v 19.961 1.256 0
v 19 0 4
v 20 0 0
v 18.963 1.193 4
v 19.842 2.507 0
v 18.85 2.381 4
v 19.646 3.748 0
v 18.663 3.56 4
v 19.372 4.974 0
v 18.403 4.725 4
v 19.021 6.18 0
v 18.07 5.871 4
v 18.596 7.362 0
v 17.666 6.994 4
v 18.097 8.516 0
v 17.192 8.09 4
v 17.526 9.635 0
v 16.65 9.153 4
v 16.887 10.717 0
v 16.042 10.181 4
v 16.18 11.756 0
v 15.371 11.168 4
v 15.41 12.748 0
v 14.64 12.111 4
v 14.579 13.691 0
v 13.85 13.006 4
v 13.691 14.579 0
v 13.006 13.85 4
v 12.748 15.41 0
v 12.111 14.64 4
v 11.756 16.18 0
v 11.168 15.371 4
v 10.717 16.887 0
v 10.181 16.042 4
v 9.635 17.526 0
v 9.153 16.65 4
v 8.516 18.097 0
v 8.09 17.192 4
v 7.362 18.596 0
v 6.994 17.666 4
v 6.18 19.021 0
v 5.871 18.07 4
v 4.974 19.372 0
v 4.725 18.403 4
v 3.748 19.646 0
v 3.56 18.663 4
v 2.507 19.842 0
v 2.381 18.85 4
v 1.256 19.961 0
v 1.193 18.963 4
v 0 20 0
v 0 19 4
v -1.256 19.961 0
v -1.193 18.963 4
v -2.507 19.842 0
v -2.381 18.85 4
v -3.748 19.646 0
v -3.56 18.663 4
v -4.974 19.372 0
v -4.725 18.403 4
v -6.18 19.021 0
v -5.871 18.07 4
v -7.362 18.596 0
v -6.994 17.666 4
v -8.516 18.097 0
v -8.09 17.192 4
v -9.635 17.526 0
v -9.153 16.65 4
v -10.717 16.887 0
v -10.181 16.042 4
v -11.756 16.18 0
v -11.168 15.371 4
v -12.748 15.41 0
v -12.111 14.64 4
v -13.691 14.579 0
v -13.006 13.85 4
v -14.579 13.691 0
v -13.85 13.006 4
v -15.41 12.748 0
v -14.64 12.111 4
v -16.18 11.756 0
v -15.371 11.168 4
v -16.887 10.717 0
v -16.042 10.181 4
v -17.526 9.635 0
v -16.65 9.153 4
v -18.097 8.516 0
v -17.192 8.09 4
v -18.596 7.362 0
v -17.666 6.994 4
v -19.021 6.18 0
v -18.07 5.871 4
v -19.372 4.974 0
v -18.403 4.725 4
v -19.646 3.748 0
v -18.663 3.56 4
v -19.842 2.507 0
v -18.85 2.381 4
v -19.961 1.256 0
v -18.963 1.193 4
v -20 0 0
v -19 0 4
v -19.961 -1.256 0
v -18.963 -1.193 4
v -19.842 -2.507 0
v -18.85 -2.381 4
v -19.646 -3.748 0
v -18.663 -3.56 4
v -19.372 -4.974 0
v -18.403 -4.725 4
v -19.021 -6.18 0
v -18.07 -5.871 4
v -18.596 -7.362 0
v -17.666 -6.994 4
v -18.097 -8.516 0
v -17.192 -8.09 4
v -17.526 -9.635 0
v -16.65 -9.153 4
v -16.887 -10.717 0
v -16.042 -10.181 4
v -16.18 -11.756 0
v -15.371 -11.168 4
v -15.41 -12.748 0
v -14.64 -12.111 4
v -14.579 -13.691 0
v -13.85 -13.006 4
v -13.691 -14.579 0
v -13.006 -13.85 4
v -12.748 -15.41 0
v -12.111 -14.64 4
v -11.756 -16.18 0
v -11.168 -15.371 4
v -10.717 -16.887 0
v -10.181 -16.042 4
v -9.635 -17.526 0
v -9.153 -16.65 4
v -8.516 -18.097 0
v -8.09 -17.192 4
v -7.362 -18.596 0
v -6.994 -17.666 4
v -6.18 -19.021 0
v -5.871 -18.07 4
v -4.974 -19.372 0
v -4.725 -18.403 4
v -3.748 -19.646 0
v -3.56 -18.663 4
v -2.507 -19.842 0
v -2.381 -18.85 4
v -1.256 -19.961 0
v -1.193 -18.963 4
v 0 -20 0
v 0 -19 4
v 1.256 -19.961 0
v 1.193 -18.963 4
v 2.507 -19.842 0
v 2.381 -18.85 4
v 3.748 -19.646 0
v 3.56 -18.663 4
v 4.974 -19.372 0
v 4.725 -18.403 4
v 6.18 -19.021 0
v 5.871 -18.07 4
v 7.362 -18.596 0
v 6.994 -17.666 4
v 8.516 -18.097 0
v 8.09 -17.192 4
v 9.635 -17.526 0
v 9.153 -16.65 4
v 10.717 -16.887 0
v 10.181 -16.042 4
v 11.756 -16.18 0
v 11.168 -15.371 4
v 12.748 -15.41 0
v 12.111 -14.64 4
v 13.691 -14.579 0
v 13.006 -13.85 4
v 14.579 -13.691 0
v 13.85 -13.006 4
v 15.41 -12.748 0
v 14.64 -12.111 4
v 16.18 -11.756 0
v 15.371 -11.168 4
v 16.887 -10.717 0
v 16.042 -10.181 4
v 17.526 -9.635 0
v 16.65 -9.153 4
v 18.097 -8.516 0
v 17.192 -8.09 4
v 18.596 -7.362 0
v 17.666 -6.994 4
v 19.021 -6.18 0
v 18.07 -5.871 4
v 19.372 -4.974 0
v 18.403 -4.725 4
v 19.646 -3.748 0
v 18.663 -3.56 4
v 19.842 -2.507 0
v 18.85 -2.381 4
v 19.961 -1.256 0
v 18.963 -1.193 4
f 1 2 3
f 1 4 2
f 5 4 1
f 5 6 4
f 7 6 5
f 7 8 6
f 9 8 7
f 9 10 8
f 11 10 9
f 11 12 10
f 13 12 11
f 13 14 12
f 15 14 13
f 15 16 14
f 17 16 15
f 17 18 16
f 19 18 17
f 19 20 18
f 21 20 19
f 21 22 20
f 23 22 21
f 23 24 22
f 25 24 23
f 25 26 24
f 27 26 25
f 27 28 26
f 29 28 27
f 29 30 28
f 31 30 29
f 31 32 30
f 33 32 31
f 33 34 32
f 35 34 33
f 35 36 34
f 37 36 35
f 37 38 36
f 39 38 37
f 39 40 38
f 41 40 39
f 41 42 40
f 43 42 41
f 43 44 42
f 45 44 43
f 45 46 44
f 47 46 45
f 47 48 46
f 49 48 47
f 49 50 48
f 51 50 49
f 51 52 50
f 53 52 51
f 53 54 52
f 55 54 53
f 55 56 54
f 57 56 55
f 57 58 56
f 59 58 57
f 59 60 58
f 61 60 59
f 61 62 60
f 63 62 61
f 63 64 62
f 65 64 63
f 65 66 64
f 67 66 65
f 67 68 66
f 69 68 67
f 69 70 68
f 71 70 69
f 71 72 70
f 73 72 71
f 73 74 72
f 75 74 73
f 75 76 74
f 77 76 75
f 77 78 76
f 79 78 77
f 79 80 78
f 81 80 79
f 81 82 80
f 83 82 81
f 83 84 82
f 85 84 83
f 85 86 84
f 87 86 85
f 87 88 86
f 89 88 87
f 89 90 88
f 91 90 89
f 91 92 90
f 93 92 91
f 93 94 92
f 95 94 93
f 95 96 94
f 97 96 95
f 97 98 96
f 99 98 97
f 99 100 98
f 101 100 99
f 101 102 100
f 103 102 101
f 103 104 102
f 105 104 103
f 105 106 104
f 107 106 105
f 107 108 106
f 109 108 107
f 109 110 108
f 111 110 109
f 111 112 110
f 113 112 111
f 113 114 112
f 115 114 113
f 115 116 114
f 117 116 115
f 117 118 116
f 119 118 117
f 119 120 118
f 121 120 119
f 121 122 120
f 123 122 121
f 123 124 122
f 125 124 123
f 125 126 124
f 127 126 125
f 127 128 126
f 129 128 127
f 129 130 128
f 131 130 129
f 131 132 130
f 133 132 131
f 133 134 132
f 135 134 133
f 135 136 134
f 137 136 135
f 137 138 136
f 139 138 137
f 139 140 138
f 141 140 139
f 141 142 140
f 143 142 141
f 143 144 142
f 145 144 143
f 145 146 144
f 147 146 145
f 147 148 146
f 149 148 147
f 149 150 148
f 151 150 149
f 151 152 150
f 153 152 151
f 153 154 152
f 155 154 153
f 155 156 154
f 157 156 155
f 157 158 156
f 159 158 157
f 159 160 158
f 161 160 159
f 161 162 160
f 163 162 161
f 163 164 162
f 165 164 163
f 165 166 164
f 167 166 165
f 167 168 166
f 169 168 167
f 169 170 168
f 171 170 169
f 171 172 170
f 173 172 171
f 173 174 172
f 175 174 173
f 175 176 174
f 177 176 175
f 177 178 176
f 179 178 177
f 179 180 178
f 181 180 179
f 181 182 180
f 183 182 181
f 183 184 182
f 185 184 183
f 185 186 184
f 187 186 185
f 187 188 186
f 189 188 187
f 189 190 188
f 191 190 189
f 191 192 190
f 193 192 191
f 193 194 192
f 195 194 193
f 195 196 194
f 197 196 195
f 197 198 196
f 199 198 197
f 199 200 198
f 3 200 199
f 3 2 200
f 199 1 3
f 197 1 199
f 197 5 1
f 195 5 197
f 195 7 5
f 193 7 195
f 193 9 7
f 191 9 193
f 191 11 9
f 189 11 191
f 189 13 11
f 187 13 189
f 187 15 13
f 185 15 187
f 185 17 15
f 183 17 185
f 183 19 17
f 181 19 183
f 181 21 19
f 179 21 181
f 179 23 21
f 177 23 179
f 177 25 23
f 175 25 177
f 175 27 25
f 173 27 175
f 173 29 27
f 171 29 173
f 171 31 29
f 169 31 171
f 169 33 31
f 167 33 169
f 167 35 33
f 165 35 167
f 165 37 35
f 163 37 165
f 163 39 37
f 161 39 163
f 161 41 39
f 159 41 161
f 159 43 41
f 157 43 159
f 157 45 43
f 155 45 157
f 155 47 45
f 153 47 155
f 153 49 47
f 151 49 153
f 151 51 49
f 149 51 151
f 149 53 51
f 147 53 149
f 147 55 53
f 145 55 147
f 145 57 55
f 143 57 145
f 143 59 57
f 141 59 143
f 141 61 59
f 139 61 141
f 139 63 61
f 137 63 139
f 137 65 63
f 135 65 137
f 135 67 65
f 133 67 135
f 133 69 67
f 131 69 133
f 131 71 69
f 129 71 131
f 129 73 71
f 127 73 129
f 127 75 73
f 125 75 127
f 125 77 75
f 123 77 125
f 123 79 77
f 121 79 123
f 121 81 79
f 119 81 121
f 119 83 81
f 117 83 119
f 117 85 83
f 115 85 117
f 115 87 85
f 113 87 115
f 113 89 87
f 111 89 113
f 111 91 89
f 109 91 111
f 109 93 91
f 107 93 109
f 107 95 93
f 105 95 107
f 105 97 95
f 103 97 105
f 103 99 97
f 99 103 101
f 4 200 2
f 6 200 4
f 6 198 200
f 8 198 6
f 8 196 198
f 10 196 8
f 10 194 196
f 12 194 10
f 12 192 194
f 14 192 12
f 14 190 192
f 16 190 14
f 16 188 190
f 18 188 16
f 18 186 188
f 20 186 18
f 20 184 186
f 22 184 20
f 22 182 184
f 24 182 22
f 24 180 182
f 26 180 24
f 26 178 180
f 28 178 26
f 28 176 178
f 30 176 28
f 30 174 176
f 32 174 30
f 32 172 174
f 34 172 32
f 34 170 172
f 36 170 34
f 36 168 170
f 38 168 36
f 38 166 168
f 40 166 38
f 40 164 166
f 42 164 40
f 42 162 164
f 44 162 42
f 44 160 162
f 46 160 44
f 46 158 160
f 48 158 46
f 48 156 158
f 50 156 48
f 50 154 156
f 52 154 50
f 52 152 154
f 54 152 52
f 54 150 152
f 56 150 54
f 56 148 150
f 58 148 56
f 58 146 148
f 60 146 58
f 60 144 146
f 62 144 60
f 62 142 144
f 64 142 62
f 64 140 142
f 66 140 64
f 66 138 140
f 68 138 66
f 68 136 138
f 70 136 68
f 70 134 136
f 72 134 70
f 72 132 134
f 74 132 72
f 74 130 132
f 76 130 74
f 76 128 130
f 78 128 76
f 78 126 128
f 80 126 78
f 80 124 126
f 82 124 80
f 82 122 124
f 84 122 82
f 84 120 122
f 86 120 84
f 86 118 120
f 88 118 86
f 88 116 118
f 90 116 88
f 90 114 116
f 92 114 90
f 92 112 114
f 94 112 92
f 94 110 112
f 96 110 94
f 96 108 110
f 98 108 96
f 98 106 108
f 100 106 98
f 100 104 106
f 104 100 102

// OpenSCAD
// file: build.scad
$build_id = "";

function building(filename) = is_undef(filename) ?
  !is_undef(build)
  : !is_undef(build) && build == filename;

function previewing() = !building();

module build(filename) {
  $build_id = filename;

  if(!is_undef(scad_build_scan) && scad_build_scan == true) {
    echo(str("scad_build_scan: ", filename));
  }
  else if(previewing() || build == filename) {
    children();
  }
}

module preview_row(spacing) {
  if(previewing()) {
    for(x = [0:1:$children - 1]) {
      translate([x * spacing, 0, 0]) {
        children(x);
      }
    }
  }
  else {
    children();
  }
}

module preview_column(spacing) {
  if(previewing()) {
    for(y = [0:1:$children - 1]) {
      translate([0, y * spacing, 0]) {
        children(y);
      }
    }
  }
  else {
    children();
  }
}
// file: minibase.scad
// Based off of titancraft's Customizable Miniature Base (CC0 1.0)
// https://www.thingiverse.com/thing:1112237

include <./build.scad>

$base_rim = 1; //	[1: tapered, 2: inclined, 3: flat]
// Number of sides:
$base_shape = 100; //	[30:Low-res Circle, 100: Hi-res Circle, 5:Pentagon, 6:Hexagon, 8:Octagon, 4:Square, 3:Triangle]

$base_diameter = 32;
$base_height = 4;
$base_slant = 95; // [50:100]

// Percentage:
$base_stretch = 100;

//('Cool' base only)
$base_inner_circle_ratio = 40; // [10:80]

module tapered(r=40) {
  $base_rim = 1;
  $base_inner_circle_ratio = r;

  children();
}

module inclined() {
  $base_rim = 2;

  children();
}

module flat() {
  $base_rim = 3;

  children();
}

module shape(s) {
  $base_shape = s;

  children();
}

module diameter(d) {
  $base_diameter = d;

  children();
}

module height(h) {
  $base_height = h;

  children();
}

module slant(s) {
  $base_slant = s;

  children();
}

module stretch(s) {
  $base_stretch = s;

  children();
}

module base(id) {
  build(id) union() {
    radius = $base_diameter/2;
    scale([$base_stretch/100, 1, 1]){
      if ($base_rim == 1){
        // tapered base
        cyl1_height = $base_height * (1-$base_inner_circle_ratio/100);
        cylinder(cyl1_height, radius, radius * $base_slant/100, $fn=$base_shape);

        cyl2_radius = radius  * $base_slant/100 * .95;
        cyl2_height = $base_height - cyl1_height;

        translate([0, 0, cyl1_height]){
          cylinder(cyl2_height, cyl2_radius, cyl2_radius * $base_slant/100, $fn=$base_shape);
          cylinder(cyl2_height*.5, radius * $base_slant/100, cyl2_radius, $fn=$base_shape);
        }
      } else if ($base_rim == 2){
        // inclined base
        cylinder($base_height, radius, radius * $base_slant/100, $fn=$base_shape);
      } else if ($base_rim == 3){
        // flat base

        cylinder($base_height, radius, radius, $fn=$base_shape);
      }
    }
  }
}
// main file
include <./minibase.scad>

inclined() diameter(40) base("40mm-opr-infantry-large");
